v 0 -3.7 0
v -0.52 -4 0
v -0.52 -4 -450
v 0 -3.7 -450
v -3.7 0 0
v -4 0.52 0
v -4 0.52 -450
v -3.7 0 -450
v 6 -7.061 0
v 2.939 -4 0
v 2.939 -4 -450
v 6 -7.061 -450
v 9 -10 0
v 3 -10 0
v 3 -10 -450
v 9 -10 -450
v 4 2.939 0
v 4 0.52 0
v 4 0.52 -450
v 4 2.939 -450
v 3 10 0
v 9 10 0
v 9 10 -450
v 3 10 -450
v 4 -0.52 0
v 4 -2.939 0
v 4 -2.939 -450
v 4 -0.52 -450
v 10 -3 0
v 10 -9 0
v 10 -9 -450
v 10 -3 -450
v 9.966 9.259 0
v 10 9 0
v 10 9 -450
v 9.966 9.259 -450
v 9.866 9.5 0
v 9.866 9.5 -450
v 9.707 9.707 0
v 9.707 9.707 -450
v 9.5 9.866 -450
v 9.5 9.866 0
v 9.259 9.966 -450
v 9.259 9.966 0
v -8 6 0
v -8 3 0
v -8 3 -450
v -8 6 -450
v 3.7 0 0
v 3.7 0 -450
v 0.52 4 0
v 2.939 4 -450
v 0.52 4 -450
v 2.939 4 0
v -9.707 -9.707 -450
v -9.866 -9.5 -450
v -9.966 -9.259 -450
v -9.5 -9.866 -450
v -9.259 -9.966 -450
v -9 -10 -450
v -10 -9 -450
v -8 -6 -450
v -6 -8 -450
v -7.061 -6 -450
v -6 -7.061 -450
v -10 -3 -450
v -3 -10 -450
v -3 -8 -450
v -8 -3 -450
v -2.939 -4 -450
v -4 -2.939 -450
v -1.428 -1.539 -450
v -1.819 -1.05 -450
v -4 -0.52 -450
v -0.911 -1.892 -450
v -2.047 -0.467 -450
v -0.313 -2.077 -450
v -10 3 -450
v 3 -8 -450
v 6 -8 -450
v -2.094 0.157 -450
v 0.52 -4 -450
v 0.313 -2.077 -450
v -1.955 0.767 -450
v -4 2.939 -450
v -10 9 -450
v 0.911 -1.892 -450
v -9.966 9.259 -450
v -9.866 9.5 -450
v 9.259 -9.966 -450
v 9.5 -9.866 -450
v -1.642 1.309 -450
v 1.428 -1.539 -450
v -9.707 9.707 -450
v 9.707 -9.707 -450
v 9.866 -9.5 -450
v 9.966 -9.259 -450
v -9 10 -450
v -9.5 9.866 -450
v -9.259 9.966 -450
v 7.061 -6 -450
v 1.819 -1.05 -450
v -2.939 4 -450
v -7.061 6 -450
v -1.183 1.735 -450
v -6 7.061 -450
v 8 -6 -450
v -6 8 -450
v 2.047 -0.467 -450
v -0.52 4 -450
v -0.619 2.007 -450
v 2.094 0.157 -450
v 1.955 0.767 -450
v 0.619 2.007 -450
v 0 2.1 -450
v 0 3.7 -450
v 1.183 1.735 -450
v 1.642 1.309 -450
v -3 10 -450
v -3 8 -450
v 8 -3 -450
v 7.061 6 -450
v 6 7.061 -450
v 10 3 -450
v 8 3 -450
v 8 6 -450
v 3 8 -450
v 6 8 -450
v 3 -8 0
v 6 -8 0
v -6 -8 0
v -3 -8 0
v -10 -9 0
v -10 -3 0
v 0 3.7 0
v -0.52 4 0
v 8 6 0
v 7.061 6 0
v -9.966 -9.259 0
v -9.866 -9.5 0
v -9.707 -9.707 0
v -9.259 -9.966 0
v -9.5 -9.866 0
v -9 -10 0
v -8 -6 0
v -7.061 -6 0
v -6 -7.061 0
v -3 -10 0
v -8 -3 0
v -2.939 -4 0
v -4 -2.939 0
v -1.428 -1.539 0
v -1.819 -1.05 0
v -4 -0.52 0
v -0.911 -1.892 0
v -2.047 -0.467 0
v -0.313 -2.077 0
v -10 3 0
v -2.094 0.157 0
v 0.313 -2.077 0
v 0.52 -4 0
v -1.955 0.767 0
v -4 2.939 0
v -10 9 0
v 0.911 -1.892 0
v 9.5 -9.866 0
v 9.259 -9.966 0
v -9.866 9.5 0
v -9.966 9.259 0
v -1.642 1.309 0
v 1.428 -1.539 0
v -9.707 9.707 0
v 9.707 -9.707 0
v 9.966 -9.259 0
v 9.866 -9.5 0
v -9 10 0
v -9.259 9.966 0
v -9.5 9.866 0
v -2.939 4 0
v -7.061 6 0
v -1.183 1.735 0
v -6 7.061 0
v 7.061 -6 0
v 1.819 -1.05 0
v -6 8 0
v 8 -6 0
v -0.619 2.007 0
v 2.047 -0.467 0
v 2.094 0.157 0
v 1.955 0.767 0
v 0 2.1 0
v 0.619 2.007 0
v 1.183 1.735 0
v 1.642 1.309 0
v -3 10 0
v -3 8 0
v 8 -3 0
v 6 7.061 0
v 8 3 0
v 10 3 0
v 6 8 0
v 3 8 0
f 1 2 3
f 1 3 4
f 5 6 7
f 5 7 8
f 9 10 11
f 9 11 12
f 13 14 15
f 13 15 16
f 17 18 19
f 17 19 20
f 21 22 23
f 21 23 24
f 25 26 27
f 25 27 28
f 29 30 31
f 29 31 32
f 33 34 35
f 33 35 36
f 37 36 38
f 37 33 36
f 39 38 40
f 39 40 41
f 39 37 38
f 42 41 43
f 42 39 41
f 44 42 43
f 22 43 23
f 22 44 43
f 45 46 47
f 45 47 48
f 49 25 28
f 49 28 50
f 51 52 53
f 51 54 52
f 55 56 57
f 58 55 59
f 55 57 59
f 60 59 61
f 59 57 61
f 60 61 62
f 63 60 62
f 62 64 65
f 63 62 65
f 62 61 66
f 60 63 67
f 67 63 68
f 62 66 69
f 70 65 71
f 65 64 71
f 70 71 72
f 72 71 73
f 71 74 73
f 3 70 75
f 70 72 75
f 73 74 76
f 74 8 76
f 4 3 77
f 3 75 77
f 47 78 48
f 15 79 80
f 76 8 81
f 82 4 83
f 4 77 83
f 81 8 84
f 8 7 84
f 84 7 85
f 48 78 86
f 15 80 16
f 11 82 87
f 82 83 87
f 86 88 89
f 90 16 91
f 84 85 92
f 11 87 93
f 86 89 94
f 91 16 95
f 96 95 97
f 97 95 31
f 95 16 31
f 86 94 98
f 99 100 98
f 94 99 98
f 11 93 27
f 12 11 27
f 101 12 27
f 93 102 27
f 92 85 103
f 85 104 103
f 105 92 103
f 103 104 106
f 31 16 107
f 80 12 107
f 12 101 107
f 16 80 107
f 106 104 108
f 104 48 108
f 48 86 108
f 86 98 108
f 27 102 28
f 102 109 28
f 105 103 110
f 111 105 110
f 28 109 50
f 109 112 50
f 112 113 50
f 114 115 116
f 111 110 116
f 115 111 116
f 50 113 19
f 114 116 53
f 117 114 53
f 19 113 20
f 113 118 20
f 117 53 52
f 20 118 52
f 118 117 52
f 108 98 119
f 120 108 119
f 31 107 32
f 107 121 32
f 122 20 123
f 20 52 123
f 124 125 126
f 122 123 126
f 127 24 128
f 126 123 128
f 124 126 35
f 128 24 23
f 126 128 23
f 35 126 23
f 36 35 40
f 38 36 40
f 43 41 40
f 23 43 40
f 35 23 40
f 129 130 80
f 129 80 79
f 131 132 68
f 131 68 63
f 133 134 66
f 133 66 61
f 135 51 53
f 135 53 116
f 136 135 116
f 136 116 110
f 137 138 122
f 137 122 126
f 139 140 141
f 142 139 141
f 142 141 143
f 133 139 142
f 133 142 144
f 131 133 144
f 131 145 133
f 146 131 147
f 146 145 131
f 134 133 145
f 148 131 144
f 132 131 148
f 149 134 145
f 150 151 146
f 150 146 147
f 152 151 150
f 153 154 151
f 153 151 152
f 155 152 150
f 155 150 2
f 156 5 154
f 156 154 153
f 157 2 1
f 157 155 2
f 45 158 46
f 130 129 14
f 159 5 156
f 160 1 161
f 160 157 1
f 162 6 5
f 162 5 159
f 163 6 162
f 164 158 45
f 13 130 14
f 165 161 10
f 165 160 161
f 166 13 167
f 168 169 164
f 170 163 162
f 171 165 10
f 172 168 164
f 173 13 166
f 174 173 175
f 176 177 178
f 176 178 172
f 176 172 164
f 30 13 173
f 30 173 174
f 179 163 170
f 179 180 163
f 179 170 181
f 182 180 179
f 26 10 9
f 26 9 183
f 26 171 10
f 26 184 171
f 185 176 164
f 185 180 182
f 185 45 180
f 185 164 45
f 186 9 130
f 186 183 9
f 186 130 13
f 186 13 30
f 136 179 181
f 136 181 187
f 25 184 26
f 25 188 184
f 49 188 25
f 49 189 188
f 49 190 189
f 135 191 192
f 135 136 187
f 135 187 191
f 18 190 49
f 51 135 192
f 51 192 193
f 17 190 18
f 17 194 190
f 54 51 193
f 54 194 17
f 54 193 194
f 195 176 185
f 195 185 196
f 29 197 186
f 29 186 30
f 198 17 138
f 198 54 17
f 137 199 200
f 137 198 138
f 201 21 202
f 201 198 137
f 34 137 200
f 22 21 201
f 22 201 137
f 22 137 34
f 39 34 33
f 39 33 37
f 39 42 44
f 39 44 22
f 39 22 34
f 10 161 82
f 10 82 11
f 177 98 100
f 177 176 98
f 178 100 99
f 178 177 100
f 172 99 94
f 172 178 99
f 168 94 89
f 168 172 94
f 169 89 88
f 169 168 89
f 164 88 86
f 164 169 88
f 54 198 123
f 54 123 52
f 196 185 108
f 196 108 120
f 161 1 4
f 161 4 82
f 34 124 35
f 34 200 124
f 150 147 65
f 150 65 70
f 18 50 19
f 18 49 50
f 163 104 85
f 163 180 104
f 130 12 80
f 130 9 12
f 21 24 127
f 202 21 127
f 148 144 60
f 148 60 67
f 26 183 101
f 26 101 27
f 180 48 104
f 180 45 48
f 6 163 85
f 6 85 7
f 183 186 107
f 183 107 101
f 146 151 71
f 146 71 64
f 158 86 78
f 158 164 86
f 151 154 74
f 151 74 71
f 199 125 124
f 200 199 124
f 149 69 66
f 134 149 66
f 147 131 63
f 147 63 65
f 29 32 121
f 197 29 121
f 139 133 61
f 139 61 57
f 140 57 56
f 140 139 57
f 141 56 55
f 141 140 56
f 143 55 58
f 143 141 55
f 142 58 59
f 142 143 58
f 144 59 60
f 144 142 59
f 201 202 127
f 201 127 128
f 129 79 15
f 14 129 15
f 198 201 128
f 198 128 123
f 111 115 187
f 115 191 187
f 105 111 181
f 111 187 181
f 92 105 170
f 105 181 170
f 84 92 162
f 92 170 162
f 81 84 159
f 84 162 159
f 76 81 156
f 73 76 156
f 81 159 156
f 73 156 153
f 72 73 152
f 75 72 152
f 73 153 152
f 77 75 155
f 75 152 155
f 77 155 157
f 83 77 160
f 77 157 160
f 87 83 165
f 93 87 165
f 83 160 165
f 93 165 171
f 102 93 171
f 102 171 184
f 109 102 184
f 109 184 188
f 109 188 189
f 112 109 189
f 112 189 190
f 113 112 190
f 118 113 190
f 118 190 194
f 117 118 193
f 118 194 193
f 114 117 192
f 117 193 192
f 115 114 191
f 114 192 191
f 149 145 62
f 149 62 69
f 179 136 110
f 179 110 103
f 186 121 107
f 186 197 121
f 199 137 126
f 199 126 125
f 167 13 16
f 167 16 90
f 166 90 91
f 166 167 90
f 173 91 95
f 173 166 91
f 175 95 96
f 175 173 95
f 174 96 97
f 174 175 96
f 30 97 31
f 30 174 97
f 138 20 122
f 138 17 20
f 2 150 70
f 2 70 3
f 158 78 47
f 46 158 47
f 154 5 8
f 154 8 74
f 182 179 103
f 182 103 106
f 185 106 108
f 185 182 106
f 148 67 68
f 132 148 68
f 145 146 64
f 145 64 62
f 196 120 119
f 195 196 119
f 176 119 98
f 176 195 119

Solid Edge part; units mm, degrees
sketch "Sketch1" plane through (0, 0, 0) normal (0, 0, 1) x (1, 0, 0)
  line L0 (-10, -3) -> (-10, -9)
  arc A0 (-10, -9) -> (-9, -10) centre (-9, -9) ccw
  line L1 (-9, -10) -> (-3, -10)
  line L2 (-3, -10) -> (-3, -8)
  line L3 (-3, -8) -> (-6, -8)
  line L4 (-6, -8) -> (-6, -7.0607)
  line L5 (-6, -7.0607) -> (-2.9393, -4)
  line L6 (-2.9393, -4) -> (-0.5196, -4)
  line L7 (-0.5196, -4) -> (0, -3.7)
  line L8 (0, -3.7) -> (0.5196, -4)
  line L9 (0.5196, -4) -> (2.9393, -4)
  line L10 (2.9393, -4) -> (6, -7.0607)
  line L11 (6, -7.0607) -> (6, -8)
  line L12 (6, -8) -> (3, -8)
  line L13 (3, -8) -> (3, -10)
  line L14 (3, -10) -> (9, -10)
  arc A1 (9, -10) -> (10, -9) centre (9, -9) ccw
  line L15 (10, -9) -> (10, -3)
  line L16 (10, -3) -> (8, -3)
  line L17 (8, -3) -> (8, -6)
  line L18 (8, -6) -> (7.0607, -6)
  line L19 (7.0607, -6) -> (4, -2.9393)
  line L20 (4, -2.9393) -> (4, -0.5196)
  line L21 (4, -0.5196) -> (3.7, 0)
  line L22 (3.7, 0) -> (4, 0.5196)
  line L23 (4, 0.5196) -> (4, 2.9393)
  line L24 (4, 2.9393) -> (7.0607, 6)
  line L25 (7.0607, 6) -> (8, 6)
  line L26 (8, 6) -> (8, 3)
  line L27 (8, 3) -> (10, 3)
  line L28 (10, 3) -> (10, 9)
  arc A2 (10, 9) -> (9, 10) centre (9, 9) ccw
  line L29 (9, 10) -> (3, 10)
  line L30 (3, 10) -> (3, 8)
  line L31 (3, 8) -> (6, 8)
  line L32 (6, 8) -> (6, 7.0607)
  line L33 (6, 7.0607) -> (2.9393, 4)
  line L34 (2.9393, 4) -> (0.5196, 4)
  line L35 (0.5196, 4) -> (0, 3.7)
  line L36 (0, 3.7) -> (-0.5196, 4)
  line L37 (-0.5196, 4) -> (-2.9393, 4)
  line L38 (-2.9393, 4) -> (-6, 7.0607)
  line L39 (-6, 7.0607) -> (-6, 8)
  line L40 (-6, 8) -> (-3, 8)
  line L41 (-3, 8) -> (-3, 10)
  line L42 (-3, 10) -> (-9, 10)
  arc A3 (-9, 10) -> (-10, 9) centre (-9, 9) ccw
  line L43 (-10, 9) -> (-10, 3)
  line L44 (-10, 3) -> (-8, 3)
  line L45 (-8, 3) -> (-8, 6)
  line L46 (-8, 6) -> (-7.0607, 6)
  line L47 (-7.0607, 6) -> (-4, 2.9393)
  line L48 (-4, 2.9393) -> (-4, 0.5196)
  line L49 (-4, 0.5196) -> (-3.7, 0)
  line L50 (-3.7, 0) -> (-4, -0.5196)
  line L51 (-4, -0.5196) -> (-4, -2.9393)
  line L52 (-4, -2.9393) -> (-7.0607, -6)
  line L53 (-7.0607, -6) -> (-8, -6)
  line L54 (-8, -6) -> (-8, -3)
  line L55 (-8, -3) -> (-10, -3)
extrude "Protrusion1" add sketch "Sketch1" against normal blind 450
hole "Bohrung_1" at (0, 0, -450) direction (0, 0, 1) diameter 4.2 depth 450
properties part number "HFS5-2020-450"
